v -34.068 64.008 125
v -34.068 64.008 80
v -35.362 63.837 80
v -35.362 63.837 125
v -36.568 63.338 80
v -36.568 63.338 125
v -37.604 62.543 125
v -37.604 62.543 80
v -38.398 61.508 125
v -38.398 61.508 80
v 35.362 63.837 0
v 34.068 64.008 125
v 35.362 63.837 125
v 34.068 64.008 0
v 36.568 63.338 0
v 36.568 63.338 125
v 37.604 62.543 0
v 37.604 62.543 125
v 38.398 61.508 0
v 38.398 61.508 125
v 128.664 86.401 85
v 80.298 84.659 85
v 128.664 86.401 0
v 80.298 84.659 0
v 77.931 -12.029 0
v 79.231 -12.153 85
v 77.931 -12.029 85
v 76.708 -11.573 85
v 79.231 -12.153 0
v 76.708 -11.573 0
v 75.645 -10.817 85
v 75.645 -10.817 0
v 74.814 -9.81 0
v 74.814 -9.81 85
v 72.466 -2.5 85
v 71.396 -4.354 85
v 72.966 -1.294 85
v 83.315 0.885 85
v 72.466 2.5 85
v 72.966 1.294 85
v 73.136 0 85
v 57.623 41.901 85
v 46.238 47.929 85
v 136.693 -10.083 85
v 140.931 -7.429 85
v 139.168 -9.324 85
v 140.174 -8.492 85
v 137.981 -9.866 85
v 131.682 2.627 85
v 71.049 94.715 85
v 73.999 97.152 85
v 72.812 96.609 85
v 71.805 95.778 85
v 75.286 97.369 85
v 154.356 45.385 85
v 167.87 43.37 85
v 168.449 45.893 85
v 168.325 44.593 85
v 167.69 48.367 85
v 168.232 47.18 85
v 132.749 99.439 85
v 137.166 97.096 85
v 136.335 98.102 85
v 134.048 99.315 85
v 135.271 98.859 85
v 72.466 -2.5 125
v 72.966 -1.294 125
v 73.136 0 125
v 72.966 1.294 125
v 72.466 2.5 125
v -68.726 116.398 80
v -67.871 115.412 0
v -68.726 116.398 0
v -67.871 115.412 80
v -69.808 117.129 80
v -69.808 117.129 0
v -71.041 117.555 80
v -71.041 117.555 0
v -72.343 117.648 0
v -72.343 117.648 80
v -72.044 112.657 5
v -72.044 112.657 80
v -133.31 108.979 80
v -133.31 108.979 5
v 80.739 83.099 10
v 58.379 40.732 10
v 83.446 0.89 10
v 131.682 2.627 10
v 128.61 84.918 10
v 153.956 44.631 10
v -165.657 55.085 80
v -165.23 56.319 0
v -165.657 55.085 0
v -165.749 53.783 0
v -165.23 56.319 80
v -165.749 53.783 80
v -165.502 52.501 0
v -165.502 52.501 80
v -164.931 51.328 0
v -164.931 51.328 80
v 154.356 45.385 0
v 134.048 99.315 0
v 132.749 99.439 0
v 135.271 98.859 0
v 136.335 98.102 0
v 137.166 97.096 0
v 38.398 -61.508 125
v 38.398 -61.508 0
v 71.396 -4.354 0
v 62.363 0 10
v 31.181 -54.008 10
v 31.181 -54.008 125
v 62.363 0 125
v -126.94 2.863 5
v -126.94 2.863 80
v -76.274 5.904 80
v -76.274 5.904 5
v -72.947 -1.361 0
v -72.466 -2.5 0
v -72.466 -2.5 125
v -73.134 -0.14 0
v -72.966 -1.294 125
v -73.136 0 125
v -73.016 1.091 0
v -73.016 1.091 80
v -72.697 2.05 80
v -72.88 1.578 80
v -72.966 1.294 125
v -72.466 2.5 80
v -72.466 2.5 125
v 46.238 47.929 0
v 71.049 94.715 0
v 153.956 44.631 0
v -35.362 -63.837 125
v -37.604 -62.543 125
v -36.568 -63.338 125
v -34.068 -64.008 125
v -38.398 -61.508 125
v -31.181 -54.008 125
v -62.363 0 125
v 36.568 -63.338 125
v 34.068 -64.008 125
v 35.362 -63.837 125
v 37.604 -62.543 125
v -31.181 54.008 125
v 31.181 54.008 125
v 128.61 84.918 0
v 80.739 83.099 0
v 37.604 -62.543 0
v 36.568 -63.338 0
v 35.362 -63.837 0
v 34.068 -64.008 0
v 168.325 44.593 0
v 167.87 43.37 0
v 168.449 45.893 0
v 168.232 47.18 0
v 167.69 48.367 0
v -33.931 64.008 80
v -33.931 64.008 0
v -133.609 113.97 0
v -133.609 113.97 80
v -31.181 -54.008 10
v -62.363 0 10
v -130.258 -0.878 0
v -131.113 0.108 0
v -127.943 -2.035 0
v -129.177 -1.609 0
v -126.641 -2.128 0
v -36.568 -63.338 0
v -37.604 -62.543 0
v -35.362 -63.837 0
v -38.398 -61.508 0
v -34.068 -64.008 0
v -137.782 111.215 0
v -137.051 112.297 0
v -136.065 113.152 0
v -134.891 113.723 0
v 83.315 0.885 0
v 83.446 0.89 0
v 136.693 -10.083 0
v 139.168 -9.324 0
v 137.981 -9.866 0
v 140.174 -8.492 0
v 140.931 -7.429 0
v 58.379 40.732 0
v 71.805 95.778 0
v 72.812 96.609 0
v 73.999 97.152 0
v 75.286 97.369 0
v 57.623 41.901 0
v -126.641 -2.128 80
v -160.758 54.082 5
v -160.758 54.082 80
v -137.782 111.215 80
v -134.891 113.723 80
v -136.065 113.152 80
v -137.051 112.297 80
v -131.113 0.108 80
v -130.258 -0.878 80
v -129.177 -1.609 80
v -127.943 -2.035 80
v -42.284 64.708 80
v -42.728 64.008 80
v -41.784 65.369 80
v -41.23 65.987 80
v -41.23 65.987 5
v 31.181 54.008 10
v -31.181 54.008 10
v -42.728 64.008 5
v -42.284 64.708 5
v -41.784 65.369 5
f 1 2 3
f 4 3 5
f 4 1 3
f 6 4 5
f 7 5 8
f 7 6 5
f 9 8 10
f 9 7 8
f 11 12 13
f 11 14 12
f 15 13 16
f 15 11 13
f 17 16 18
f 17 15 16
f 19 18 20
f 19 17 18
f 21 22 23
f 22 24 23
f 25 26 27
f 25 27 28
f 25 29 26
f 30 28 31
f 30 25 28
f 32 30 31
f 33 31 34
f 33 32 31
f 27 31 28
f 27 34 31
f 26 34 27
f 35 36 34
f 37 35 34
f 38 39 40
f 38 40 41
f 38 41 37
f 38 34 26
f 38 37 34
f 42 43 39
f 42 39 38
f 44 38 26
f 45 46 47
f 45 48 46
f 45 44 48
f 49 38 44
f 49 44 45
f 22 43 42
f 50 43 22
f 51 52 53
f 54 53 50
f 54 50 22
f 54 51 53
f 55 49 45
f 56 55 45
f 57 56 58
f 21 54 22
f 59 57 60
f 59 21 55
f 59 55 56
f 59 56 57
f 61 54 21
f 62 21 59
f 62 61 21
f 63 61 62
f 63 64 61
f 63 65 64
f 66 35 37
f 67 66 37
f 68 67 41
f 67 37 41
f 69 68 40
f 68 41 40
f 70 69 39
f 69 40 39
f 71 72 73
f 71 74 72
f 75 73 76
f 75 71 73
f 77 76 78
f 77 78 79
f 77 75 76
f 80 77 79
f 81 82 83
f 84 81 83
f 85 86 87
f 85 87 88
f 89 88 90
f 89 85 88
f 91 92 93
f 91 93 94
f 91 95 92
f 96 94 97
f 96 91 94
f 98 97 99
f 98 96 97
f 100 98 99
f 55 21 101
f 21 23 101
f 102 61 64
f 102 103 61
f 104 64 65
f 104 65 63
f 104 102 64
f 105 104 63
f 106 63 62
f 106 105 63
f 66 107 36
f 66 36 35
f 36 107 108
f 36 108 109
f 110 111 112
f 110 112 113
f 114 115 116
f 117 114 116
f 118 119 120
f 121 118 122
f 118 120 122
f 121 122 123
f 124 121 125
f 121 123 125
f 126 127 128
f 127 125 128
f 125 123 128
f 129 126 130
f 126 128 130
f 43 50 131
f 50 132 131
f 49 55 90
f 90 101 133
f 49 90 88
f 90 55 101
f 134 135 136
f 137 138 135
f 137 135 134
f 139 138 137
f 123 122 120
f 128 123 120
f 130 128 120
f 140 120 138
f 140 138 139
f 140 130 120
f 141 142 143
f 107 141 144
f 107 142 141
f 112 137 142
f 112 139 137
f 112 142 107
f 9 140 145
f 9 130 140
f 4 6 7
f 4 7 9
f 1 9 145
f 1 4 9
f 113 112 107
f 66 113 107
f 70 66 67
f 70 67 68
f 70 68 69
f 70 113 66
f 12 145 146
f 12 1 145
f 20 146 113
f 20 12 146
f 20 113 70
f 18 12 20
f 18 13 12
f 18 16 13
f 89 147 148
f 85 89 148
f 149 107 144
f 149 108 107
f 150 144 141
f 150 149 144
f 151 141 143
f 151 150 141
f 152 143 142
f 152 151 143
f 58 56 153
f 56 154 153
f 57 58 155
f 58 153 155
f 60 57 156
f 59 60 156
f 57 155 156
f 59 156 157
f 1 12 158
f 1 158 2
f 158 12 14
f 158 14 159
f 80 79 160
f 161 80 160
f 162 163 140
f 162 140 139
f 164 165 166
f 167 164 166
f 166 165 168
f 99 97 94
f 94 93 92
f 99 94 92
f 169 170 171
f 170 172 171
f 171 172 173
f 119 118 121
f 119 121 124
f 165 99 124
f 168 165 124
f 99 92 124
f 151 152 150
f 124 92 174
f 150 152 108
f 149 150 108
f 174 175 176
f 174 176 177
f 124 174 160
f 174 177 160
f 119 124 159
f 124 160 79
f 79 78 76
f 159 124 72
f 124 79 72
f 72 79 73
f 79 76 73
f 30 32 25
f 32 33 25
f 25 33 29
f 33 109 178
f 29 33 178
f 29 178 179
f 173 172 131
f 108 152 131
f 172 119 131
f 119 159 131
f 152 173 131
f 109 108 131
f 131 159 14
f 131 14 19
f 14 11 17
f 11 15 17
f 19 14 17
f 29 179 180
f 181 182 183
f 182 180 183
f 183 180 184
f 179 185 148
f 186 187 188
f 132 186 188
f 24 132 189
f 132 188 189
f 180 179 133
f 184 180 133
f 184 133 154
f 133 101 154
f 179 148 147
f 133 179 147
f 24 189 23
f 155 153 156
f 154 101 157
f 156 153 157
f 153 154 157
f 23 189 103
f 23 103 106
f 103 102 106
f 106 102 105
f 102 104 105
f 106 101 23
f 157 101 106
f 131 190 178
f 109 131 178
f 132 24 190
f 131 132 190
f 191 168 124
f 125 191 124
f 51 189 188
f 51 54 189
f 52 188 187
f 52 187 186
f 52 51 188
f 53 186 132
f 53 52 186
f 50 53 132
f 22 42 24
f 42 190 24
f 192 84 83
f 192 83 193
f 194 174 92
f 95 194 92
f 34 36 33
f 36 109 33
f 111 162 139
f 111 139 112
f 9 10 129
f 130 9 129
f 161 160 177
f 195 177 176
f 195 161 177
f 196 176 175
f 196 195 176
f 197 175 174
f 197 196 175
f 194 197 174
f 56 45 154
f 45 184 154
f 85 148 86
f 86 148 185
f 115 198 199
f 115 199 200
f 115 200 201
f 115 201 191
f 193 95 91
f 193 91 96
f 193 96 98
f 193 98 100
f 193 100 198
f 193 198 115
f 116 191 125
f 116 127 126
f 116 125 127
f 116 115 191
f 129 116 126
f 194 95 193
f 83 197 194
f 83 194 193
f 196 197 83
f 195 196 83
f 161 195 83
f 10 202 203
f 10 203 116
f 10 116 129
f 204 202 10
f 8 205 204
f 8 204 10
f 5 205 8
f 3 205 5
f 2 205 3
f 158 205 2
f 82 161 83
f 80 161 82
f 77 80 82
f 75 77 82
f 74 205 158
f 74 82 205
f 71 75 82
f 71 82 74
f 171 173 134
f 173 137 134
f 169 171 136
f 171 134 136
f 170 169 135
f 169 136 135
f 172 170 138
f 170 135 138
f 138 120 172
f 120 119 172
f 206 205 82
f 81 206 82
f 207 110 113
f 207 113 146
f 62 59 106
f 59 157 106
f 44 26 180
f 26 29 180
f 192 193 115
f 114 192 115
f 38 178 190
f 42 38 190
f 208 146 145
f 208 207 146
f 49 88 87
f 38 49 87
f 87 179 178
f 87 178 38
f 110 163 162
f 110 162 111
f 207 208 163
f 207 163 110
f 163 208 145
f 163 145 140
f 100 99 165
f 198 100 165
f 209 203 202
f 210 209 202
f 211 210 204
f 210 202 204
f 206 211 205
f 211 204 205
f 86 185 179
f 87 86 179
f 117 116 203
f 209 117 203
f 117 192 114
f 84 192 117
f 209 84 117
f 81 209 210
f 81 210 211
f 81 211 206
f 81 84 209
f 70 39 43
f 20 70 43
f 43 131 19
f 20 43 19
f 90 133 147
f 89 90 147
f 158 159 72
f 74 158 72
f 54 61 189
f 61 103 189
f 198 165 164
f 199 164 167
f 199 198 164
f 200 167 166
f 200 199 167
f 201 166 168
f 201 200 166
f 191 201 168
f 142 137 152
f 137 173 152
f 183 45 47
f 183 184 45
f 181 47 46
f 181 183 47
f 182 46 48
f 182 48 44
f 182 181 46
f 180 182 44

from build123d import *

# Parameters (mm, degrees)
F1_DEPTH  = 100
F3_DEPTH  = 90
F4_DEPTH  = 25
F5_R      = 5
F7_DEPTH  = 25
F8_DEPTH  = 60
F9_R      = 5
F11_DEPTH = 10
F12_DEPTH = 50
F14_DEPTH = 10
F16_DEPTH = 80
F18_DEPTH = 75
F19_R     = 5


with BuildPart() as f1:
    # F0 (on Top) → F1 (new body)
    with BuildSketch(Plane.XY):
        Polygon((36.954793705, 64.0075802803), (-36.954793705, 64.0075802803), (-73.90958741, 0), (-36.954793705, -64.0075802803), (36.954793705, -64.0075802803), (73.90958741, 0), align=None)
    extrude(amount=F1_DEPTH)

    # F2 (on face) → F3 (cut)
    with BuildSketch(Plane.XY.offset(100)):
        Polygon((31.1812910131, 54.0075802803), (-31.1812910131, 54.0075802803), (-62.3625820262, 0), (-31.1812910131, -54.0075802803), (31.1812910131, -54.0075802803), (62.3625820262, 0), align=None)
    extrude(amount=-F3_DEPTH, mode=Mode.SUBTRACT)

    # F4 (add): a face of the model
    f4_faces = [f1.faces().sort_by_distance(p)[0] for p in [
        (53.7387091631, 31.0260582012, 100),
    ]]
    extrude(f4_faces, amount=F4_DEPTH)

    # F5
    f5_edges = [f1.edges().sort_by_distance(p)[0] for p in [
        (36.954794, -64.00758, 62.5),
        (73.909587, 0, 62.5),
        (36.954794, 64.00758, 62.5),
        (-36.954794, -64.00758, 62.5),
        (-73.909587, 0, 62.5),
        (-36.954794, 64.00758, 62.5),
    ]]
    fillet(f5_edges, radius=F5_R)

    # F6 (on Top) → F7 (join)
    with BuildSketch(Plane.XY):
        Polygon((72.4010563695, 97.2648855515), (42.7573003567, 41.3652363949), (76.3459385825, -12.2568339541), (139.5783328212, -9.9792551465), (169.222088834, 45.9203940101), (135.6334506082, 99.5424643591), align=None)
        Polygon((57.6229365769, 41.9006843788), (80.2975860361, 84.6585909333), (128.6643440546, 86.400721757), (154.3564526138, 45.3849460261), (131.6818031546, 2.6270394716), (83.3150451361, 0.884908648), align=None, mode=Mode.SUBTRACT)
    extrude(amount=F7_DEPTH)

    # F8 (add): a face of the model
    f8_faces = [f1.faces().sort_by_distance(p)[0] for p in [
        (104.0770804564, 96.7426995418, 25),
    ]]
    extrude(f8_faces, amount=F8_DEPTH)

    # F9
    f9_edges = [f1.edges().sort_by_distance(p)[0] for p in [
        (139.578333, -9.979255, 42.5),
        (169.222089, 45.920394, 42.5),
        (135.633451, 99.542464, 42.5),
        (76.345939, -12.256834, 42.5),
        (72.401056, 97.264886, 42.5),
    ]]
    fillet(f9_edges, radius=F9_R)

    # F13 (on Top) → F14 (join)
    with BuildSketch(Plane.XY):
        Polygon((80.7393563532, 83.0987106545), (58.3791809535, 40.7320548312), (83.8896934701, 0.1842469904), (131.7603813863, 2.0030949728), (154.120556786, 44.3697507961), (128.6100442695, 84.917558637), align=None)
    extrude(amount=F14_DEPTH)

    # F15 (on Top) → F16 (join)
    with BuildSketch(Plane.XY):
        Polygon((-62.4931809091, 1.7224331433), (-32.4628147698, 61.7831568187), (-69.4617441727, 117.8205786179), (-136.4910397149, 113.7972767418), (-166.5214058542, 53.7365530664), (-129.5224764513, -2.3008687328), align=None)
    extrude(amount=F16_DEPTH)

    # F17 (on face) → F18 (cut)
    with BuildSketch(Plane.XY.offset(80)):
        with BuildLine():
            Line((-72.0437333661, 112.6566009709), (-133.3098984847, 108.9792196846))
            Line((-133.3098984847, 108.9792196846), (-160.7582754306, 54.0824736562))
            Line((-160.7582754306, 54.0824736562), (-126.9404872579, 2.8631089142))
            Line((-126.9404872579, 2.8631089142), (-76.2742702816, 5.9042491226))
            Line((-76.2742702816, 5.9042491226), (-42.7282963969, 64.0075802803))
            ThreePointArc((-42.7282963969, 64.0075802803), (-42.0407030657, 65.043860696), (-41.2297996458, 65.986780275))
            Line((-41.2297996458, 65.986780275), (-72.0437333661, 112.6566009709))
        make_face()
    extrude(amount=-F18_DEPTH, mode=Mode.SUBTRACT)

    # F19
    f19_edges = [f1.edges().sort_by_distance(p)[0] for p in [
        (-129.522476, -2.300869, 40),
        (-166.521406, 53.736553, 40),
        (-136.49104, 113.797277, 40),
        (-69.461744, 117.820579, 40),
    ]]
    fillet(f19_edges, radius=F19_R)


with BuildPart() as f11:
    # F10 (on face) → F11 (new body)
    with BuildSketch(Plane.XY.offset(85)):
        Polygon((80.2975860361, 84.6585909333), (57.6229365769, 41.9006843788), (83.3150451361, 0.884908648), (131.6818031546, 2.6270394716), (154.3564526138, 45.3849460261), (128.6643440546, 86.400721757), align=None)
    extrude(amount=F11_DEPTH)

    # F12 (cut): a face of the model
    f12_faces = [f11.faces().sort_by_distance(p)[0] for p in [
        (105.9896945953, 43.6428152025, 95),
    ]]
    extrude(f12_faces, amount=-F12_DEPTH, mode=Mode.SUBTRACT)


solid = f1.part
